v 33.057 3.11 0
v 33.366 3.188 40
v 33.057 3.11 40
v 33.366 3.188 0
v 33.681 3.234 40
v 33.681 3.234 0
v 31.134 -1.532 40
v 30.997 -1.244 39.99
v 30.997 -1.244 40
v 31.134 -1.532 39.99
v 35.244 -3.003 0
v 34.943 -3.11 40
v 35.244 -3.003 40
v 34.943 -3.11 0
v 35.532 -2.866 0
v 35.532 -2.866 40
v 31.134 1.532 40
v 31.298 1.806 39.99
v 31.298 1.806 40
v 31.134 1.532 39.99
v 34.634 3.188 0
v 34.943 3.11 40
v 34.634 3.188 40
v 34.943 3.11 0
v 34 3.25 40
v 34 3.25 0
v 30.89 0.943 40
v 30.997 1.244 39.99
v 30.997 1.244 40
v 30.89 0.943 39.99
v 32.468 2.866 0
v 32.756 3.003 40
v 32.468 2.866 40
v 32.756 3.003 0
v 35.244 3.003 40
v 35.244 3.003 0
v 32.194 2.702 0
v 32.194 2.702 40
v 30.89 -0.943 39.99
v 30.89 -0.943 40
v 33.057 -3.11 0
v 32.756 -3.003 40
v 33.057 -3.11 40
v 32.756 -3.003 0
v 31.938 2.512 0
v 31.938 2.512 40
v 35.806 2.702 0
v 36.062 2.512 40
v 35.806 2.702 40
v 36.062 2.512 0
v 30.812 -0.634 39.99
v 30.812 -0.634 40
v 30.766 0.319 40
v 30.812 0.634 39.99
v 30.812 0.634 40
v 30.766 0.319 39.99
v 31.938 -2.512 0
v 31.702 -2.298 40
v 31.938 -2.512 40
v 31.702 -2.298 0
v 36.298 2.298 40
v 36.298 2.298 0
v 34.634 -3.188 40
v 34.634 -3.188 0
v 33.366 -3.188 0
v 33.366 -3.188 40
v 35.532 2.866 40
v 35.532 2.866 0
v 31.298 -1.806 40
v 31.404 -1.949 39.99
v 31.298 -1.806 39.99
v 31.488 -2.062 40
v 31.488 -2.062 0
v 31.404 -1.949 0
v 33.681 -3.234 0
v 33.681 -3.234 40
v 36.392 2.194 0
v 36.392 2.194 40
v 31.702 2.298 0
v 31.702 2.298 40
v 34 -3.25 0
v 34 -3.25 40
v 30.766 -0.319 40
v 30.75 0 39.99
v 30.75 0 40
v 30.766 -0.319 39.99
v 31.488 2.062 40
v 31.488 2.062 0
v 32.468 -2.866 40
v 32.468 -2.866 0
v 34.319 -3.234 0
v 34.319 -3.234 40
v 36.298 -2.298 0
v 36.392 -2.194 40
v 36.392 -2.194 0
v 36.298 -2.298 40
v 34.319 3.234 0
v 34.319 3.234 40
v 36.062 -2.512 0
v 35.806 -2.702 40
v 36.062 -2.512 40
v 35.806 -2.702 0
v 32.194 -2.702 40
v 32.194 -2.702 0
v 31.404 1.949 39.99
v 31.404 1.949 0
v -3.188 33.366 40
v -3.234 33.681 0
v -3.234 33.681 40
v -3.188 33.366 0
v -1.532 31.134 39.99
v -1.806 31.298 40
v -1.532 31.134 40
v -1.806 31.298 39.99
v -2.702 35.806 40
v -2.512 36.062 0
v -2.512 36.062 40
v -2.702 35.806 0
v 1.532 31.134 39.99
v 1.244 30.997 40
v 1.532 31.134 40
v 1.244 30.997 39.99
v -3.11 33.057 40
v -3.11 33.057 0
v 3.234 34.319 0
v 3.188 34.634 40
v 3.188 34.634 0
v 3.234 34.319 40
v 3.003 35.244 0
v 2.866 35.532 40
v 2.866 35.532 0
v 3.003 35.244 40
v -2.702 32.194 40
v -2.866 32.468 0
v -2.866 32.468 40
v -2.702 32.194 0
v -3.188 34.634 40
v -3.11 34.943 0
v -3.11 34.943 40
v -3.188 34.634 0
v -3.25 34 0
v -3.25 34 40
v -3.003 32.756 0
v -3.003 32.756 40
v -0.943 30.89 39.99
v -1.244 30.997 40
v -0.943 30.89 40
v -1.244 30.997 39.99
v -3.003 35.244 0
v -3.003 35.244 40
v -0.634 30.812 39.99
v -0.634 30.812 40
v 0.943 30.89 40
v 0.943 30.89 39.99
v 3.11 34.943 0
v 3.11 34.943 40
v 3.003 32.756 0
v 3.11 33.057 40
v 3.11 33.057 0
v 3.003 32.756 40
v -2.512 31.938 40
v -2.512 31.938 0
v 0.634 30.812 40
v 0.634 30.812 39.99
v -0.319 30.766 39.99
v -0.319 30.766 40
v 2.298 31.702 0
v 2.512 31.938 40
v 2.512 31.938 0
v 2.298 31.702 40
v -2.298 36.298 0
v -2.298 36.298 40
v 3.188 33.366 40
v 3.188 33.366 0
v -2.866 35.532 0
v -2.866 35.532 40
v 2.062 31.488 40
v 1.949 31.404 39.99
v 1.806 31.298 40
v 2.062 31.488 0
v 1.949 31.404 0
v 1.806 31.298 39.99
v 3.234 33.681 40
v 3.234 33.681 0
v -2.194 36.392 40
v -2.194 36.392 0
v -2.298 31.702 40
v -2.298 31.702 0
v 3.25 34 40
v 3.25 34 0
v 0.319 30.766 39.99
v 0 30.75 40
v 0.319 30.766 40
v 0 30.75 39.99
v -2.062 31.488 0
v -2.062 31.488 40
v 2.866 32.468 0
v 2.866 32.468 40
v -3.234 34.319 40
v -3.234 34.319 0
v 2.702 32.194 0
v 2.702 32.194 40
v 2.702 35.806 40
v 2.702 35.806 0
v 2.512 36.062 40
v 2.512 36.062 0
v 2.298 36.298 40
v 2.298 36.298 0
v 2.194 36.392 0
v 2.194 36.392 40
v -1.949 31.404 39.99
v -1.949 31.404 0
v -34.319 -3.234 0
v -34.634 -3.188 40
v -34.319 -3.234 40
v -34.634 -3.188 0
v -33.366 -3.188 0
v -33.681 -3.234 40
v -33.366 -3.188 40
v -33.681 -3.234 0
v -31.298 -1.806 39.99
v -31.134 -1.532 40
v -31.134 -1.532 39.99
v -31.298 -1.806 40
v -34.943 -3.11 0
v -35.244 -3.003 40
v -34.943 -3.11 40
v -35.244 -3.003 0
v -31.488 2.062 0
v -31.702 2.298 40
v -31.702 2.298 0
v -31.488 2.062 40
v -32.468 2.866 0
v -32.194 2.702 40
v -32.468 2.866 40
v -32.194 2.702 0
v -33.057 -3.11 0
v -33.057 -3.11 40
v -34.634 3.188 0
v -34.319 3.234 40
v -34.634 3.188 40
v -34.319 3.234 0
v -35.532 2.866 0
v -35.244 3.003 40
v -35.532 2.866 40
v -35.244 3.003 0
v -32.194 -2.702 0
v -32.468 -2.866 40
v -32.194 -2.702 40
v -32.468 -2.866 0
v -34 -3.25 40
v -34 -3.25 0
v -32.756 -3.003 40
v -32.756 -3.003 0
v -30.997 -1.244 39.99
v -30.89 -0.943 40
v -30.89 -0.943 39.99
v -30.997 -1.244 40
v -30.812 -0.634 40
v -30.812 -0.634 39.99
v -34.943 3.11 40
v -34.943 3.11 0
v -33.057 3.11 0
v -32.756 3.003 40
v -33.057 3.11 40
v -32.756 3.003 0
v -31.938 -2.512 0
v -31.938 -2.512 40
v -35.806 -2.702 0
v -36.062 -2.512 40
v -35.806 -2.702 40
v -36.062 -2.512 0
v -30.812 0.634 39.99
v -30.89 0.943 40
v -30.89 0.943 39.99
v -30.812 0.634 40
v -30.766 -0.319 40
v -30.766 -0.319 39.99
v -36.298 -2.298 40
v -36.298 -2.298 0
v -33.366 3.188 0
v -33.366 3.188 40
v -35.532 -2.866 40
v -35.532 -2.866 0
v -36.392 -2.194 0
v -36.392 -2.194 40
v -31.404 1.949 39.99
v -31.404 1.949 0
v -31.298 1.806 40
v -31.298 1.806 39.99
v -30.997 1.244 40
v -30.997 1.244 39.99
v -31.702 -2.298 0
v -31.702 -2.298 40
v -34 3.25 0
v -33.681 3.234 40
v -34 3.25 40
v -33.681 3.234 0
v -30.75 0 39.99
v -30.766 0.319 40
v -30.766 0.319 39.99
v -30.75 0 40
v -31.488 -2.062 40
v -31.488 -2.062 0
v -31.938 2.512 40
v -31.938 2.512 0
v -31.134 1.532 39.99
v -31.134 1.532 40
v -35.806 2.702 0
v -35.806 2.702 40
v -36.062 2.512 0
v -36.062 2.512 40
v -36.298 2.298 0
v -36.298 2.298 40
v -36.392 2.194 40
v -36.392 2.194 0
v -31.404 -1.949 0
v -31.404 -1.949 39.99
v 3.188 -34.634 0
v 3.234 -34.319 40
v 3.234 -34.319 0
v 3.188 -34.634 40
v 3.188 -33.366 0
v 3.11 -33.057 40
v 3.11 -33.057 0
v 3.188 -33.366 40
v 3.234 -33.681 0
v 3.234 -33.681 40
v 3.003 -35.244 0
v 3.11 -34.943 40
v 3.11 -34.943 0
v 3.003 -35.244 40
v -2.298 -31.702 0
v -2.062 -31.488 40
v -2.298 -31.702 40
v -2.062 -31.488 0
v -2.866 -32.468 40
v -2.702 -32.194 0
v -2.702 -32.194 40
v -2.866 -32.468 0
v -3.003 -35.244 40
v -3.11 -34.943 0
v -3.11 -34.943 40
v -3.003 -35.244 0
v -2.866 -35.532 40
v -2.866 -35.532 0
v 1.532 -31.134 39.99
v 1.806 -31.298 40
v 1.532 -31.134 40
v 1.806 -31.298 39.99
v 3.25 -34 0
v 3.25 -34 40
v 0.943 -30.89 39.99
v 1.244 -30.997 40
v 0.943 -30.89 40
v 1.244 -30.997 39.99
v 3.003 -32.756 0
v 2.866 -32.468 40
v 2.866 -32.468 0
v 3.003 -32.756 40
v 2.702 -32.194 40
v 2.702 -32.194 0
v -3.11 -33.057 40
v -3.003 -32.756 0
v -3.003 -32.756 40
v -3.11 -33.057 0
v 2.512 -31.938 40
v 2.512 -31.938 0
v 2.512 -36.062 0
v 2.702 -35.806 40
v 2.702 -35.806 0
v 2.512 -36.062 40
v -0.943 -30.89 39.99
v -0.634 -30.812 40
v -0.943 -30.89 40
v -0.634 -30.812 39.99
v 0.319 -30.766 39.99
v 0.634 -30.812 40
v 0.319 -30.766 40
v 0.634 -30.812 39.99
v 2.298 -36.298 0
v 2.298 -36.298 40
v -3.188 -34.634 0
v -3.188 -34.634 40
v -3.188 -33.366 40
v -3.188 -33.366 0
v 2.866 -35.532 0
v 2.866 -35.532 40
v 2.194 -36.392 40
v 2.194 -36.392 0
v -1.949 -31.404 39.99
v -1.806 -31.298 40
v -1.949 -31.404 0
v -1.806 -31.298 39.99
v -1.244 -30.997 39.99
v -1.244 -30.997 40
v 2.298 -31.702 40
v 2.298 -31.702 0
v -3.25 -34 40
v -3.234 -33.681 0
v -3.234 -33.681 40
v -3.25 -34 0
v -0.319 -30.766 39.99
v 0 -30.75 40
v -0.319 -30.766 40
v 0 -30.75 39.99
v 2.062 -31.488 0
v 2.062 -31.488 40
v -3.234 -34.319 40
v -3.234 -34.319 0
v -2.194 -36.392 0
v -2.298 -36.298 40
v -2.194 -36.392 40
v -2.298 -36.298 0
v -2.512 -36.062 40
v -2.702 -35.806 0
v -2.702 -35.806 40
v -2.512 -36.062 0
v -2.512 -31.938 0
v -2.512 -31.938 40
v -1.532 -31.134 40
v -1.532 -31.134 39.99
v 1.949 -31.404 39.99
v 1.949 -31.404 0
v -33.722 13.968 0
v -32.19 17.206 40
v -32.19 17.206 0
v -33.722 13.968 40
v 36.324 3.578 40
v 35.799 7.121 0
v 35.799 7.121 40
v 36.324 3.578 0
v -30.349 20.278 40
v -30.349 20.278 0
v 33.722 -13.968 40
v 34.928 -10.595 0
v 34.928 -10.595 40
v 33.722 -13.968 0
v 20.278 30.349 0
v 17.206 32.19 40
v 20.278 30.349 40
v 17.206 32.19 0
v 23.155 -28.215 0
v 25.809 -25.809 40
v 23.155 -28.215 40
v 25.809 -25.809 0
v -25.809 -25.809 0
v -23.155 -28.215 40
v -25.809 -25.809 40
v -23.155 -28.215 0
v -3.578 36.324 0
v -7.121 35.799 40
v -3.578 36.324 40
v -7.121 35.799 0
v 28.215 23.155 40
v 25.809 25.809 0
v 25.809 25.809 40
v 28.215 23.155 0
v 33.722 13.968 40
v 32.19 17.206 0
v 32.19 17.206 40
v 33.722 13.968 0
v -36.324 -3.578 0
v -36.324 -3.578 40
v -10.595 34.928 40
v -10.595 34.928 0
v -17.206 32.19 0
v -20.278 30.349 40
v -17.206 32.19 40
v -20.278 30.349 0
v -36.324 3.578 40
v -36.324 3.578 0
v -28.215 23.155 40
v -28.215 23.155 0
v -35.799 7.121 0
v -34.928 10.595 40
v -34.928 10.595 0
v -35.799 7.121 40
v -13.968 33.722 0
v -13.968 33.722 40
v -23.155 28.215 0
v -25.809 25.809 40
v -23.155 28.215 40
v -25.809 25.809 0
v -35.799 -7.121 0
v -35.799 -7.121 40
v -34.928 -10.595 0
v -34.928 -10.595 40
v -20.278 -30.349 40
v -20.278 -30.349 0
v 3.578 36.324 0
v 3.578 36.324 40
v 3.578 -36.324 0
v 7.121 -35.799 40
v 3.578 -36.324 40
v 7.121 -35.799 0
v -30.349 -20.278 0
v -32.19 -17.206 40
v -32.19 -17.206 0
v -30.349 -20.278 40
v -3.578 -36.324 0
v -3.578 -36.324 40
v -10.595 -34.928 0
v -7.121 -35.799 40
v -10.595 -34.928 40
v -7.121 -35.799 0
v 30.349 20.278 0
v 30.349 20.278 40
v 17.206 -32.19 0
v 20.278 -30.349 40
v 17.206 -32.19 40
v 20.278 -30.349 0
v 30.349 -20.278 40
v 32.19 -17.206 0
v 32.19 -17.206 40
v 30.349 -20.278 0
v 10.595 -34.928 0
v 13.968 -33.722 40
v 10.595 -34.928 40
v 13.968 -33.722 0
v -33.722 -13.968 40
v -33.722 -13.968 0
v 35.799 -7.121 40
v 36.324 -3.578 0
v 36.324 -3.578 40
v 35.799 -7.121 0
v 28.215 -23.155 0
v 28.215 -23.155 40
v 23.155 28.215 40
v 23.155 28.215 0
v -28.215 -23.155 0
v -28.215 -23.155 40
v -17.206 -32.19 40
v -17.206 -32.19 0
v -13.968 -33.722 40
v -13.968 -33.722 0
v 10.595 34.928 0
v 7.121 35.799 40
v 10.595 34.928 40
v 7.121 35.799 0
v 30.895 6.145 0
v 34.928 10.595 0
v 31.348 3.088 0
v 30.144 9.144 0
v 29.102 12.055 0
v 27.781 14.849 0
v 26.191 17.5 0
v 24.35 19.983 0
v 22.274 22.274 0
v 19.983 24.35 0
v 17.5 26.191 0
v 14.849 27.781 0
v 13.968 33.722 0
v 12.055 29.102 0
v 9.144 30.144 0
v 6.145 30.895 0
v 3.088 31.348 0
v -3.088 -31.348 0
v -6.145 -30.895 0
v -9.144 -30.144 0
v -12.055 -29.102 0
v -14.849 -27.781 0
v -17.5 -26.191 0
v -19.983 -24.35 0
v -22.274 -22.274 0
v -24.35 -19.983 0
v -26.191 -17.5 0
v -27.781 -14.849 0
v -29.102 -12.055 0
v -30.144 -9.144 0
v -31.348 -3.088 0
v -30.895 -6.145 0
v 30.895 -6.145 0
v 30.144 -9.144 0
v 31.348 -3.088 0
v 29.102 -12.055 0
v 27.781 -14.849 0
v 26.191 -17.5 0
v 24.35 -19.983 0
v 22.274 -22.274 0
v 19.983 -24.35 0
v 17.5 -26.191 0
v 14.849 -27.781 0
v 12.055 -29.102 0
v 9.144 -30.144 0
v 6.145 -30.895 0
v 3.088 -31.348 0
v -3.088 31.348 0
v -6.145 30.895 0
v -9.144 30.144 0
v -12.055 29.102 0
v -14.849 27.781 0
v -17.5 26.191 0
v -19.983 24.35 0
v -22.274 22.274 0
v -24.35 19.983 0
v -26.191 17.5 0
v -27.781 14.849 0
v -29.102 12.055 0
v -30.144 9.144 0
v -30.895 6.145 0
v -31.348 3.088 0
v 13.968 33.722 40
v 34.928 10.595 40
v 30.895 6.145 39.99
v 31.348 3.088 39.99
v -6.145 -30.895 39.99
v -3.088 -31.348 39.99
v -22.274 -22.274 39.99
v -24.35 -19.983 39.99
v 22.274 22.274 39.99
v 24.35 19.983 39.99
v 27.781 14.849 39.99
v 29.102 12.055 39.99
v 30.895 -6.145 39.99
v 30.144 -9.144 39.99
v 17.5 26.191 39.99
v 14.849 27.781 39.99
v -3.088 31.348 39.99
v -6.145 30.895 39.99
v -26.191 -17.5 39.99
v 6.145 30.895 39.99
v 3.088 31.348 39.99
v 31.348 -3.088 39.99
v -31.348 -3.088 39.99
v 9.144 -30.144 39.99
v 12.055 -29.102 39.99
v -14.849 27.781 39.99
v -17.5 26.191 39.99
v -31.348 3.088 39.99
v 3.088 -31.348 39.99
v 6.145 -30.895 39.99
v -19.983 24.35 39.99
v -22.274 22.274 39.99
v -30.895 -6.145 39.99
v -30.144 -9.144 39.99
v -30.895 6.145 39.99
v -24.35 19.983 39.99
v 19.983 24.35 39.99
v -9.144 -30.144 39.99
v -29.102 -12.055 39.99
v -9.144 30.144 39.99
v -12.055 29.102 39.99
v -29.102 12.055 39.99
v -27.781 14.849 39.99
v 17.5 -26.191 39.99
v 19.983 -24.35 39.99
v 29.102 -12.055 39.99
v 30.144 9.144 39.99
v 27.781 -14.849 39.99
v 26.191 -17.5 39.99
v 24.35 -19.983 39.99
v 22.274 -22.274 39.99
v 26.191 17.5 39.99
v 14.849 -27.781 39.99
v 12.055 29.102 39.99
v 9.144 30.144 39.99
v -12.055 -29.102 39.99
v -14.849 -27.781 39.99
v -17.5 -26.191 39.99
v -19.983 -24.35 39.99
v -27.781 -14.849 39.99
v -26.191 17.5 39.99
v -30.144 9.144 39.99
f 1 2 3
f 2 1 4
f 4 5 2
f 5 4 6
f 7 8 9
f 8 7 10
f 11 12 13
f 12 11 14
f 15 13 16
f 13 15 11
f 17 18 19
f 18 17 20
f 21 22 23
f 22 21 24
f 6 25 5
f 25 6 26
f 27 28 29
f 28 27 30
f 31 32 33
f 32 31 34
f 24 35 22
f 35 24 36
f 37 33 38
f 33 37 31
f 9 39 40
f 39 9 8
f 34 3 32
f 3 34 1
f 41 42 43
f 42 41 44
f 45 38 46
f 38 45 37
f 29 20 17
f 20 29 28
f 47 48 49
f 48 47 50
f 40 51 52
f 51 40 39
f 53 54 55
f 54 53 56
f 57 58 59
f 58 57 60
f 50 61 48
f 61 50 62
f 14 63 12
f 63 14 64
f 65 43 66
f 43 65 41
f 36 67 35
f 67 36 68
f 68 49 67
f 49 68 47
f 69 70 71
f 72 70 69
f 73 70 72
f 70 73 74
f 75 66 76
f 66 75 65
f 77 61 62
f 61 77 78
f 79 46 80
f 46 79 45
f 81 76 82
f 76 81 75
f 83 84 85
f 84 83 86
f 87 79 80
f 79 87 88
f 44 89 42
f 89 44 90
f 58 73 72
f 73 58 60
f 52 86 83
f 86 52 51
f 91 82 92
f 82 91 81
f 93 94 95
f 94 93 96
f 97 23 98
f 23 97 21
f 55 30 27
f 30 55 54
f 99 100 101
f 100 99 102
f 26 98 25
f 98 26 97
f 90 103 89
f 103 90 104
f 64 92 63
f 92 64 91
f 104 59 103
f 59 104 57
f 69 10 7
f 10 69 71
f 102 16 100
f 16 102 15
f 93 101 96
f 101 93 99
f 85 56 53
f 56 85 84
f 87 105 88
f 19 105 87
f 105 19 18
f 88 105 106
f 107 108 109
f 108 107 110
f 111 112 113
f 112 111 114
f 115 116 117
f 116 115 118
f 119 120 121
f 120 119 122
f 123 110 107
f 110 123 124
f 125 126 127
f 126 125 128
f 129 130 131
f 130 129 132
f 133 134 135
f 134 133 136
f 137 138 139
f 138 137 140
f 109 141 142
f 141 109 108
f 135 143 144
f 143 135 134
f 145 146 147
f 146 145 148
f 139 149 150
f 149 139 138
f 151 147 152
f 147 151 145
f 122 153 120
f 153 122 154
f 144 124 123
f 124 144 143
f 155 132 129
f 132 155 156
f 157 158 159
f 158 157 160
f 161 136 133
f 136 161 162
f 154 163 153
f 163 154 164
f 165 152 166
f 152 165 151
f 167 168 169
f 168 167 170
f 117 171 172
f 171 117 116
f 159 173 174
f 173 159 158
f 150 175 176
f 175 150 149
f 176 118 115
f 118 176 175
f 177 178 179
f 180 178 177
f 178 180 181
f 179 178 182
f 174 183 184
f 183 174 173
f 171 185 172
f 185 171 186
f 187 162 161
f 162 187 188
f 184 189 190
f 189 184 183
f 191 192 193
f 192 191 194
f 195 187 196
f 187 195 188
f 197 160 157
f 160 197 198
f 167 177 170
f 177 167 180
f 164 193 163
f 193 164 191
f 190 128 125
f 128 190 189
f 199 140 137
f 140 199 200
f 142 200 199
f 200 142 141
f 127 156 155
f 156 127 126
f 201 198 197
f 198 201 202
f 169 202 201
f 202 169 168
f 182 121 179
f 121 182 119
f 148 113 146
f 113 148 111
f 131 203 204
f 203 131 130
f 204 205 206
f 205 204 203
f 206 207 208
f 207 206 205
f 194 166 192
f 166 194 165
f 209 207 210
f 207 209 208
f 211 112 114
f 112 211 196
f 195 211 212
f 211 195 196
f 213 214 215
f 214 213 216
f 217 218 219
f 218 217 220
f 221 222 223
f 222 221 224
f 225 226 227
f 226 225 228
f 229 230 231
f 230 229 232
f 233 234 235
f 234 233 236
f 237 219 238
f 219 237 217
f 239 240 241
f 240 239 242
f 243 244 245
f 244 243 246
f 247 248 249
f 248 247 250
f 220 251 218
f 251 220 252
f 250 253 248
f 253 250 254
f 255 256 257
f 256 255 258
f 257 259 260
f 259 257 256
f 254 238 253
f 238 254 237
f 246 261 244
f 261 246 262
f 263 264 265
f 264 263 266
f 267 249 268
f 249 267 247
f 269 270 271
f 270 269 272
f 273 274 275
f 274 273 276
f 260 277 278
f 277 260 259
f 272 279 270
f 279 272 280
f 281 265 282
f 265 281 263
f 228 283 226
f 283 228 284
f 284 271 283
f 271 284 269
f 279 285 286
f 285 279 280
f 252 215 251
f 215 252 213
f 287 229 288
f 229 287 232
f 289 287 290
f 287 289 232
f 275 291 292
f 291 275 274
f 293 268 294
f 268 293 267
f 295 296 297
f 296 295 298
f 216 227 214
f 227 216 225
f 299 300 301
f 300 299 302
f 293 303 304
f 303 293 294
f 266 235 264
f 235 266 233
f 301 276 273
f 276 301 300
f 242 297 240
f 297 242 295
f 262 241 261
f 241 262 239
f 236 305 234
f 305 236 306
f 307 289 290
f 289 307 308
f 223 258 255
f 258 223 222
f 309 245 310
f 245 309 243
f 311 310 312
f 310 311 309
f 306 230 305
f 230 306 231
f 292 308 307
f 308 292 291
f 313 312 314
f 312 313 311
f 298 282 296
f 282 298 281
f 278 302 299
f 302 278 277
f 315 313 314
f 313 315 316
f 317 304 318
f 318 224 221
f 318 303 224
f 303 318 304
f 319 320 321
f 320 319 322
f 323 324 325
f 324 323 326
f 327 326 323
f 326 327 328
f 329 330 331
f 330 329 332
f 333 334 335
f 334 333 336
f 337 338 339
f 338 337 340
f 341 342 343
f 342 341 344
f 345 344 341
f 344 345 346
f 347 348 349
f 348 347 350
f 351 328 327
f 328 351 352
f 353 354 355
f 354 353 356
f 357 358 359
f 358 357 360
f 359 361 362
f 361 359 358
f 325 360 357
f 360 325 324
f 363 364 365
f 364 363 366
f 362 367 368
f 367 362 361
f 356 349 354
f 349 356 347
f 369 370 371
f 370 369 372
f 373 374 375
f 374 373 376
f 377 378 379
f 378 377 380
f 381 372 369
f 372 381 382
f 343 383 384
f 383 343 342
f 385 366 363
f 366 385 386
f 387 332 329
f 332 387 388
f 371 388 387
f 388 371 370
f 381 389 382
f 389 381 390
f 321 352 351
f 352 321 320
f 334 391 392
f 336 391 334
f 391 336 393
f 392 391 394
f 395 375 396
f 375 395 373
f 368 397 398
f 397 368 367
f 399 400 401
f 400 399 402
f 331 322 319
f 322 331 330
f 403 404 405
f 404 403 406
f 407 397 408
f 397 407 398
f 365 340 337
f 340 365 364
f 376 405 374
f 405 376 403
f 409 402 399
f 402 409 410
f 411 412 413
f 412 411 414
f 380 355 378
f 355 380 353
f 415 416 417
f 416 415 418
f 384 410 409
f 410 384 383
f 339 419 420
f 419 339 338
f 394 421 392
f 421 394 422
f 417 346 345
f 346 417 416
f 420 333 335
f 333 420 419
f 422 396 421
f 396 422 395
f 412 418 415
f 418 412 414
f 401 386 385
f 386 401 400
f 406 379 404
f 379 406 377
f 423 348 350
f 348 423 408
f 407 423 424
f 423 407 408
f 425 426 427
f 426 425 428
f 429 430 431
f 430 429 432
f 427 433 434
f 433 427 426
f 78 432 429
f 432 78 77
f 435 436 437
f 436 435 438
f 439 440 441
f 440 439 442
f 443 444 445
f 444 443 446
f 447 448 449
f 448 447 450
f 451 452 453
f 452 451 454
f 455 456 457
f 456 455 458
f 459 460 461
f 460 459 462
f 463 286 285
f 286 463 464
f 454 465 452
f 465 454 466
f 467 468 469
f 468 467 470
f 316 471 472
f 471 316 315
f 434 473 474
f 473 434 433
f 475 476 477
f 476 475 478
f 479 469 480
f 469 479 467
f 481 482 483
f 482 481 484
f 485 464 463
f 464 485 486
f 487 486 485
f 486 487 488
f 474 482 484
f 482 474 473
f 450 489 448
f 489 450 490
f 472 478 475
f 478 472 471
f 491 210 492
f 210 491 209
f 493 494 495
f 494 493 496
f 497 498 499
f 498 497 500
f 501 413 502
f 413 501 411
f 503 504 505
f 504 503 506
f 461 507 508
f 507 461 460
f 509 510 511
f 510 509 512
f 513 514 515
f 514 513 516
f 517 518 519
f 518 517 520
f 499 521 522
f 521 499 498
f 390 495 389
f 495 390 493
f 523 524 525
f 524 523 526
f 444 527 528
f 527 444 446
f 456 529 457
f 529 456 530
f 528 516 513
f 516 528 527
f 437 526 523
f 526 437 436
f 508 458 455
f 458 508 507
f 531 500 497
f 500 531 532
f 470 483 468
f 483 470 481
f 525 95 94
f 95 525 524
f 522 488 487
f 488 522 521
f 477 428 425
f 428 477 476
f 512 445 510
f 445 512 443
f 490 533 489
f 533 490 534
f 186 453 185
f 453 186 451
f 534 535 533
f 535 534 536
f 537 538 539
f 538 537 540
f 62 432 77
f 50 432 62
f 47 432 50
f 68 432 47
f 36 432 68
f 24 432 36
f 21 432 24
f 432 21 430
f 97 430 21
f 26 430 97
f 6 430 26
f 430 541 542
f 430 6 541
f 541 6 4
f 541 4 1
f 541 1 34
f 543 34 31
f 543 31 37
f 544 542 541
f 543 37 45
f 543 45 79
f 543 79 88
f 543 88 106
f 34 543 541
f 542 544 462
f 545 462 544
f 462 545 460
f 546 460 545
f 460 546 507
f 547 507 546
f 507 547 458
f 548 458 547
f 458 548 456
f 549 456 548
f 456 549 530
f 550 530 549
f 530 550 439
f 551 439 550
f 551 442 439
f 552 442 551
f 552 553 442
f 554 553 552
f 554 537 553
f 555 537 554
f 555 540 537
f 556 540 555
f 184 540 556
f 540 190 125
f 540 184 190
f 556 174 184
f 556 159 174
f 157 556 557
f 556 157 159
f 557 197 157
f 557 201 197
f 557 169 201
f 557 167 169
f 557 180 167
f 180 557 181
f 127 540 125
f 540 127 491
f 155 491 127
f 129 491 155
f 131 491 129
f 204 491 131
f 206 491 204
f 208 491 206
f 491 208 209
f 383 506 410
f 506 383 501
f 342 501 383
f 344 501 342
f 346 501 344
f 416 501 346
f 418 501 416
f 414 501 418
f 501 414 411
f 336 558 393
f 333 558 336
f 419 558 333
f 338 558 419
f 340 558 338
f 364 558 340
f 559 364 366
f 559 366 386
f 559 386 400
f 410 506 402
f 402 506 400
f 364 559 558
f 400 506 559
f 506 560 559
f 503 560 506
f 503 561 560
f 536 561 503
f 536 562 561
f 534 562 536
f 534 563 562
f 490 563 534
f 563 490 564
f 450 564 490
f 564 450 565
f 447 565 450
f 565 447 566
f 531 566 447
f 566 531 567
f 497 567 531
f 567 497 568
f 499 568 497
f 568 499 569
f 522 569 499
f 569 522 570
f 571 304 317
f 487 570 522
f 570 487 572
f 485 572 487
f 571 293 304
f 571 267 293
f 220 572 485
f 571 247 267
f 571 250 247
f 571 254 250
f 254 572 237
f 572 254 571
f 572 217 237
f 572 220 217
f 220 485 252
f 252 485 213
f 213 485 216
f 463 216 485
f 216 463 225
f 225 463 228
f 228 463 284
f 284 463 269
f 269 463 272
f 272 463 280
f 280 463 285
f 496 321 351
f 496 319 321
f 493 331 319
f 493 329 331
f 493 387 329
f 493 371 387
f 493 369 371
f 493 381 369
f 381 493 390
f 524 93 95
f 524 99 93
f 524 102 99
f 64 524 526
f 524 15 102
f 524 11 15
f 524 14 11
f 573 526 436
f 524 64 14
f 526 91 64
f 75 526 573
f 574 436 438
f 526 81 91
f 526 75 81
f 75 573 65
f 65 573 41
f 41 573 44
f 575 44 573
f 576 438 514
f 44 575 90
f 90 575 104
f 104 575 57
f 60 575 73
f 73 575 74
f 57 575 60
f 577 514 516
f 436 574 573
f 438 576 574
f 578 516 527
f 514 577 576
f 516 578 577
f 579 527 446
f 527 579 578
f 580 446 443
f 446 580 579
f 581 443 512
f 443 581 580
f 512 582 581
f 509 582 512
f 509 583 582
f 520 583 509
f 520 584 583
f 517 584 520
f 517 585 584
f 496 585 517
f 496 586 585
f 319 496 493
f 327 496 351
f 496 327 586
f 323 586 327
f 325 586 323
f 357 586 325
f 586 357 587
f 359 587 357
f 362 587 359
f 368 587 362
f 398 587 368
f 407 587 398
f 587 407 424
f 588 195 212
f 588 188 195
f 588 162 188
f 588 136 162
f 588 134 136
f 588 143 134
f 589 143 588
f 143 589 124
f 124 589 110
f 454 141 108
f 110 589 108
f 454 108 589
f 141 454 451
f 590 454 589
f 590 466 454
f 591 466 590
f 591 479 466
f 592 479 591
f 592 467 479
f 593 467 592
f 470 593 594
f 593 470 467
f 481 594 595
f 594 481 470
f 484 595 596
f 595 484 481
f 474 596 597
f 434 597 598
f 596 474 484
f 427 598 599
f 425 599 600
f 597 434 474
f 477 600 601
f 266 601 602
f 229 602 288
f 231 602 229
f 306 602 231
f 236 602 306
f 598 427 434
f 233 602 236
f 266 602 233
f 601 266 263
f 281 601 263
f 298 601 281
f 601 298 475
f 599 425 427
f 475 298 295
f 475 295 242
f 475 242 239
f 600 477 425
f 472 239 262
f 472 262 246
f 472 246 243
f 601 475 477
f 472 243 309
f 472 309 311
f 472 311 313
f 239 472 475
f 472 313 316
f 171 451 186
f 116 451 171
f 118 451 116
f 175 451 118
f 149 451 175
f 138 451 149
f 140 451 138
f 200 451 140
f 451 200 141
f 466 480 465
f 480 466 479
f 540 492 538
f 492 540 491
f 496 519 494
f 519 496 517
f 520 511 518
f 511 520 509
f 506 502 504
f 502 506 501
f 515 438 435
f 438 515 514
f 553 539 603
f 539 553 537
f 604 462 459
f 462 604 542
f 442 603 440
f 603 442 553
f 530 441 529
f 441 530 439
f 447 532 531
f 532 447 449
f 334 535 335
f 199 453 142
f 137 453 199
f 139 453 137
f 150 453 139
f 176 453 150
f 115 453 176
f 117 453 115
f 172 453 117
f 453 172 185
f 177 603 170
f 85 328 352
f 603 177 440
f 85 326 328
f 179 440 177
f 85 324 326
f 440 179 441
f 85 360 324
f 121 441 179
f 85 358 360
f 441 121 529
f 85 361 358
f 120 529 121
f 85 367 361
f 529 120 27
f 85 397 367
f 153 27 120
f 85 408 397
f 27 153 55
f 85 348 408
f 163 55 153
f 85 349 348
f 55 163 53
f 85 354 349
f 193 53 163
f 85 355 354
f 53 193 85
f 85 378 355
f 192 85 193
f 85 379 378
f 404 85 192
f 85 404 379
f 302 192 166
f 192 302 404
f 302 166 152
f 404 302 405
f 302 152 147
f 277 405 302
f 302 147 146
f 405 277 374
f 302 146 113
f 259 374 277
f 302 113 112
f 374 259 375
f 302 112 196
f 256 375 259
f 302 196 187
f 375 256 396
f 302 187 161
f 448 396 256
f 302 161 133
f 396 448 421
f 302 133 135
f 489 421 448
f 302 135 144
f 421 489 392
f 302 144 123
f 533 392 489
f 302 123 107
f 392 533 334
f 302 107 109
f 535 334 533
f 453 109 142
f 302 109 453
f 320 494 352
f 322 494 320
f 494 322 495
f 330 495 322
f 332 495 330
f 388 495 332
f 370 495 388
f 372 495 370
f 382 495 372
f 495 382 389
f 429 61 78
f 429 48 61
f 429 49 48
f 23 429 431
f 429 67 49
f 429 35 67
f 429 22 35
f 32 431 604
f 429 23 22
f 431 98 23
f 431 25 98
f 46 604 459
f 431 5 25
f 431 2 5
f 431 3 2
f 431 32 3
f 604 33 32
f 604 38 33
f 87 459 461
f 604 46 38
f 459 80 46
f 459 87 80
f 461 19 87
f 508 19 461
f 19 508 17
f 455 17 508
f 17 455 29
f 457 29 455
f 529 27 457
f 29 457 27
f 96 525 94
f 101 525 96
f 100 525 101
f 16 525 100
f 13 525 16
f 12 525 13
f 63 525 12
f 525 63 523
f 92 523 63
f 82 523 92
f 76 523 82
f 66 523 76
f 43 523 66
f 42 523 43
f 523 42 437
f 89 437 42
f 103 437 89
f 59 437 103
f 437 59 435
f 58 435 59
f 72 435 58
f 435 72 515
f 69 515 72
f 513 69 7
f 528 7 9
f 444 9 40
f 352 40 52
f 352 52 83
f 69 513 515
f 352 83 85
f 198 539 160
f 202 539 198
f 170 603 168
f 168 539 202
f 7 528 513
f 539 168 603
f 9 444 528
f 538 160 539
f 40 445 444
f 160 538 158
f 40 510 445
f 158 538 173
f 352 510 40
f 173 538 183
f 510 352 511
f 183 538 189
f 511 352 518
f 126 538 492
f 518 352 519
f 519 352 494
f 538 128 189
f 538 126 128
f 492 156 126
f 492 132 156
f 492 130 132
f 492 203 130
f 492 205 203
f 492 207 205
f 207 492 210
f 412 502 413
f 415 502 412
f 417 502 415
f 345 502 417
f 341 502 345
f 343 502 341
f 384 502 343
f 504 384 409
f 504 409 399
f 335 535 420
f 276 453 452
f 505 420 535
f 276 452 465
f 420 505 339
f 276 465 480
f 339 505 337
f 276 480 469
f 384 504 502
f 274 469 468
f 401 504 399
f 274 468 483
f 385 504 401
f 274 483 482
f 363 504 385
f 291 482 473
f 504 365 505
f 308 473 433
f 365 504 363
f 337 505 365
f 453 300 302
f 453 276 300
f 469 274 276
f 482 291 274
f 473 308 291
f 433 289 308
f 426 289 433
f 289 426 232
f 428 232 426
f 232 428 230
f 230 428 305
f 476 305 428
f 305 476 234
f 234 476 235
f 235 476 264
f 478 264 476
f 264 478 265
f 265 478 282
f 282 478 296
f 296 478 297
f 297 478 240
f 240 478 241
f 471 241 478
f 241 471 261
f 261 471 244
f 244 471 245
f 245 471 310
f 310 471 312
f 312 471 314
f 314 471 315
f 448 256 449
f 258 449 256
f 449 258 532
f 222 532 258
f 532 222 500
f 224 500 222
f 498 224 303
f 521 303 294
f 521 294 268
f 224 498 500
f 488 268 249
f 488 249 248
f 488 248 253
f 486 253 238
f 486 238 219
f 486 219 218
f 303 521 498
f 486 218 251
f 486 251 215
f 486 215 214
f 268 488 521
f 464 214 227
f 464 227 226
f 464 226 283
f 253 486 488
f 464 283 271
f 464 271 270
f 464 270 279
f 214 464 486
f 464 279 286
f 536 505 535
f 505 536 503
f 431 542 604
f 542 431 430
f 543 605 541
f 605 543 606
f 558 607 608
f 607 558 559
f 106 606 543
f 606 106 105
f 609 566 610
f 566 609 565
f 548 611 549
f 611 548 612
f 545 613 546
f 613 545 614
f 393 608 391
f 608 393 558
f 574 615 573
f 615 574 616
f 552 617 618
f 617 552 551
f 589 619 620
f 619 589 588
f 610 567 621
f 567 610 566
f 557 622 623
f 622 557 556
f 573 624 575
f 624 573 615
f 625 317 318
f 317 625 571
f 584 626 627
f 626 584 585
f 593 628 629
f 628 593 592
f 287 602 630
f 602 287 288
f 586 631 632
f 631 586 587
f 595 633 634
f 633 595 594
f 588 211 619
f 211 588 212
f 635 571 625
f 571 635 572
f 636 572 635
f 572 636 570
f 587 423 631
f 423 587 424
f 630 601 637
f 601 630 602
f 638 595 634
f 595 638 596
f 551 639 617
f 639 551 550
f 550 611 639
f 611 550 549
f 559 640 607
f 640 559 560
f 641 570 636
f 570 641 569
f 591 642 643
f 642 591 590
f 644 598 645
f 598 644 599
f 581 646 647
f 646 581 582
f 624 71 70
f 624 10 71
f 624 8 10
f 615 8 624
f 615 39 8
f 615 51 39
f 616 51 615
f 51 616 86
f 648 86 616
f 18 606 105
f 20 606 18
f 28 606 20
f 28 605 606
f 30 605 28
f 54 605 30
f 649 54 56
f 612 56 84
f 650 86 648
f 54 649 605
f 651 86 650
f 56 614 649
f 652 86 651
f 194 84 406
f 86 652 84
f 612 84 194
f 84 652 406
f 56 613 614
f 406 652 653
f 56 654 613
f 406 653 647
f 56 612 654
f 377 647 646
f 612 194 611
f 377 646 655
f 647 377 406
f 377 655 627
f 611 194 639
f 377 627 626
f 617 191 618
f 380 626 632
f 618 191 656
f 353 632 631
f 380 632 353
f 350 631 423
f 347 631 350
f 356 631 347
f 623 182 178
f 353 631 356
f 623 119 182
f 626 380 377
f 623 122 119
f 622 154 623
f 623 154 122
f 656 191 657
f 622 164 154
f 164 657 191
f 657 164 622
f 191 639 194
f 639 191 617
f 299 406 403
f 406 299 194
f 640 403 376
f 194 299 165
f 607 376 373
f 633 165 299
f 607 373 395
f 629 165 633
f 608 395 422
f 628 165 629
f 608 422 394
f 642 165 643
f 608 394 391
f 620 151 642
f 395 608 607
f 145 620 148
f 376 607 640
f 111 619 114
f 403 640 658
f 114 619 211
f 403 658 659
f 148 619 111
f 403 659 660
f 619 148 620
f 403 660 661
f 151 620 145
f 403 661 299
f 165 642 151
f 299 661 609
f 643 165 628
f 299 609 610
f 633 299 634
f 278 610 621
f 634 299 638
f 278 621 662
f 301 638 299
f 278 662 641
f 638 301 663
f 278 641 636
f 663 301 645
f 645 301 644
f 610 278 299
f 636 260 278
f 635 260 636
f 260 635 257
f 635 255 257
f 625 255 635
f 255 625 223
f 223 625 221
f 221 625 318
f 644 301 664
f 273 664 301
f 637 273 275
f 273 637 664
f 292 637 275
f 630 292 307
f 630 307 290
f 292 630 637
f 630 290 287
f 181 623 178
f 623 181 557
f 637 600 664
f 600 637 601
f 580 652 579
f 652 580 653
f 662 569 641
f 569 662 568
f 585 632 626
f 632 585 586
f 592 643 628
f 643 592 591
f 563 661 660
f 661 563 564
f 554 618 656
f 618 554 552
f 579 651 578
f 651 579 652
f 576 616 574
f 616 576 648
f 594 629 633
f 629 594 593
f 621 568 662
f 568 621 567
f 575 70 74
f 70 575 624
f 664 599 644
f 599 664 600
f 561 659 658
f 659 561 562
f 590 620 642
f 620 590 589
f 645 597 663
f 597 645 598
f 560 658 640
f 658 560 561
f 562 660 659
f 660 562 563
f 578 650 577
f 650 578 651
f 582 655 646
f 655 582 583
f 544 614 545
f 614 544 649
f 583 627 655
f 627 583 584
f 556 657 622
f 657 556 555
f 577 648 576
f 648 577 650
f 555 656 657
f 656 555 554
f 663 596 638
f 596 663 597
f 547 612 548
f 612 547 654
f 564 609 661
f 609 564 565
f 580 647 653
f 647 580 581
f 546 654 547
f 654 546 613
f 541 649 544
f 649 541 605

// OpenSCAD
motor_capi = 63;
duvar_kalinligi = 5;
braket_yuksekligi = 40;
vida_deligi_capi = 6.5;
tolerans = 0.01;

assert(motor_capi > 0, "Hata: Motor çapı sıfırdan büyük olmalıdır!");
assert(duvar_kalinligi >= 2, "Uyarı: Güvenli üretim için et kalınlığı yetersiz!");

$fn = 64;

ana_montaj();

module ana_montaj() {
    difference() {
        temel_form(motor_capi + (duvar_kalinligi * 2));

        translate([0, 0, -tolerans])
            temel_form(motor_capi);

        vida_deliklerini_ac();
    }
}

module temel_form(cap) {
    linear_extrude(height = braket_yuksekligi) {
        circle(d = cap);
    }
}

module vida_deliklerini_ac() {
    for (aci = [0, 90, 180, 270]) {
        rotate([0, 0, aci])
            translate([(motor_capi/2) + (duvar_kalinligi/2), 0, -tolerans])
                cylinder(h = braket_yuksekligi + (tolerans * 2), d = vida_deligi_capi);
    }
}
